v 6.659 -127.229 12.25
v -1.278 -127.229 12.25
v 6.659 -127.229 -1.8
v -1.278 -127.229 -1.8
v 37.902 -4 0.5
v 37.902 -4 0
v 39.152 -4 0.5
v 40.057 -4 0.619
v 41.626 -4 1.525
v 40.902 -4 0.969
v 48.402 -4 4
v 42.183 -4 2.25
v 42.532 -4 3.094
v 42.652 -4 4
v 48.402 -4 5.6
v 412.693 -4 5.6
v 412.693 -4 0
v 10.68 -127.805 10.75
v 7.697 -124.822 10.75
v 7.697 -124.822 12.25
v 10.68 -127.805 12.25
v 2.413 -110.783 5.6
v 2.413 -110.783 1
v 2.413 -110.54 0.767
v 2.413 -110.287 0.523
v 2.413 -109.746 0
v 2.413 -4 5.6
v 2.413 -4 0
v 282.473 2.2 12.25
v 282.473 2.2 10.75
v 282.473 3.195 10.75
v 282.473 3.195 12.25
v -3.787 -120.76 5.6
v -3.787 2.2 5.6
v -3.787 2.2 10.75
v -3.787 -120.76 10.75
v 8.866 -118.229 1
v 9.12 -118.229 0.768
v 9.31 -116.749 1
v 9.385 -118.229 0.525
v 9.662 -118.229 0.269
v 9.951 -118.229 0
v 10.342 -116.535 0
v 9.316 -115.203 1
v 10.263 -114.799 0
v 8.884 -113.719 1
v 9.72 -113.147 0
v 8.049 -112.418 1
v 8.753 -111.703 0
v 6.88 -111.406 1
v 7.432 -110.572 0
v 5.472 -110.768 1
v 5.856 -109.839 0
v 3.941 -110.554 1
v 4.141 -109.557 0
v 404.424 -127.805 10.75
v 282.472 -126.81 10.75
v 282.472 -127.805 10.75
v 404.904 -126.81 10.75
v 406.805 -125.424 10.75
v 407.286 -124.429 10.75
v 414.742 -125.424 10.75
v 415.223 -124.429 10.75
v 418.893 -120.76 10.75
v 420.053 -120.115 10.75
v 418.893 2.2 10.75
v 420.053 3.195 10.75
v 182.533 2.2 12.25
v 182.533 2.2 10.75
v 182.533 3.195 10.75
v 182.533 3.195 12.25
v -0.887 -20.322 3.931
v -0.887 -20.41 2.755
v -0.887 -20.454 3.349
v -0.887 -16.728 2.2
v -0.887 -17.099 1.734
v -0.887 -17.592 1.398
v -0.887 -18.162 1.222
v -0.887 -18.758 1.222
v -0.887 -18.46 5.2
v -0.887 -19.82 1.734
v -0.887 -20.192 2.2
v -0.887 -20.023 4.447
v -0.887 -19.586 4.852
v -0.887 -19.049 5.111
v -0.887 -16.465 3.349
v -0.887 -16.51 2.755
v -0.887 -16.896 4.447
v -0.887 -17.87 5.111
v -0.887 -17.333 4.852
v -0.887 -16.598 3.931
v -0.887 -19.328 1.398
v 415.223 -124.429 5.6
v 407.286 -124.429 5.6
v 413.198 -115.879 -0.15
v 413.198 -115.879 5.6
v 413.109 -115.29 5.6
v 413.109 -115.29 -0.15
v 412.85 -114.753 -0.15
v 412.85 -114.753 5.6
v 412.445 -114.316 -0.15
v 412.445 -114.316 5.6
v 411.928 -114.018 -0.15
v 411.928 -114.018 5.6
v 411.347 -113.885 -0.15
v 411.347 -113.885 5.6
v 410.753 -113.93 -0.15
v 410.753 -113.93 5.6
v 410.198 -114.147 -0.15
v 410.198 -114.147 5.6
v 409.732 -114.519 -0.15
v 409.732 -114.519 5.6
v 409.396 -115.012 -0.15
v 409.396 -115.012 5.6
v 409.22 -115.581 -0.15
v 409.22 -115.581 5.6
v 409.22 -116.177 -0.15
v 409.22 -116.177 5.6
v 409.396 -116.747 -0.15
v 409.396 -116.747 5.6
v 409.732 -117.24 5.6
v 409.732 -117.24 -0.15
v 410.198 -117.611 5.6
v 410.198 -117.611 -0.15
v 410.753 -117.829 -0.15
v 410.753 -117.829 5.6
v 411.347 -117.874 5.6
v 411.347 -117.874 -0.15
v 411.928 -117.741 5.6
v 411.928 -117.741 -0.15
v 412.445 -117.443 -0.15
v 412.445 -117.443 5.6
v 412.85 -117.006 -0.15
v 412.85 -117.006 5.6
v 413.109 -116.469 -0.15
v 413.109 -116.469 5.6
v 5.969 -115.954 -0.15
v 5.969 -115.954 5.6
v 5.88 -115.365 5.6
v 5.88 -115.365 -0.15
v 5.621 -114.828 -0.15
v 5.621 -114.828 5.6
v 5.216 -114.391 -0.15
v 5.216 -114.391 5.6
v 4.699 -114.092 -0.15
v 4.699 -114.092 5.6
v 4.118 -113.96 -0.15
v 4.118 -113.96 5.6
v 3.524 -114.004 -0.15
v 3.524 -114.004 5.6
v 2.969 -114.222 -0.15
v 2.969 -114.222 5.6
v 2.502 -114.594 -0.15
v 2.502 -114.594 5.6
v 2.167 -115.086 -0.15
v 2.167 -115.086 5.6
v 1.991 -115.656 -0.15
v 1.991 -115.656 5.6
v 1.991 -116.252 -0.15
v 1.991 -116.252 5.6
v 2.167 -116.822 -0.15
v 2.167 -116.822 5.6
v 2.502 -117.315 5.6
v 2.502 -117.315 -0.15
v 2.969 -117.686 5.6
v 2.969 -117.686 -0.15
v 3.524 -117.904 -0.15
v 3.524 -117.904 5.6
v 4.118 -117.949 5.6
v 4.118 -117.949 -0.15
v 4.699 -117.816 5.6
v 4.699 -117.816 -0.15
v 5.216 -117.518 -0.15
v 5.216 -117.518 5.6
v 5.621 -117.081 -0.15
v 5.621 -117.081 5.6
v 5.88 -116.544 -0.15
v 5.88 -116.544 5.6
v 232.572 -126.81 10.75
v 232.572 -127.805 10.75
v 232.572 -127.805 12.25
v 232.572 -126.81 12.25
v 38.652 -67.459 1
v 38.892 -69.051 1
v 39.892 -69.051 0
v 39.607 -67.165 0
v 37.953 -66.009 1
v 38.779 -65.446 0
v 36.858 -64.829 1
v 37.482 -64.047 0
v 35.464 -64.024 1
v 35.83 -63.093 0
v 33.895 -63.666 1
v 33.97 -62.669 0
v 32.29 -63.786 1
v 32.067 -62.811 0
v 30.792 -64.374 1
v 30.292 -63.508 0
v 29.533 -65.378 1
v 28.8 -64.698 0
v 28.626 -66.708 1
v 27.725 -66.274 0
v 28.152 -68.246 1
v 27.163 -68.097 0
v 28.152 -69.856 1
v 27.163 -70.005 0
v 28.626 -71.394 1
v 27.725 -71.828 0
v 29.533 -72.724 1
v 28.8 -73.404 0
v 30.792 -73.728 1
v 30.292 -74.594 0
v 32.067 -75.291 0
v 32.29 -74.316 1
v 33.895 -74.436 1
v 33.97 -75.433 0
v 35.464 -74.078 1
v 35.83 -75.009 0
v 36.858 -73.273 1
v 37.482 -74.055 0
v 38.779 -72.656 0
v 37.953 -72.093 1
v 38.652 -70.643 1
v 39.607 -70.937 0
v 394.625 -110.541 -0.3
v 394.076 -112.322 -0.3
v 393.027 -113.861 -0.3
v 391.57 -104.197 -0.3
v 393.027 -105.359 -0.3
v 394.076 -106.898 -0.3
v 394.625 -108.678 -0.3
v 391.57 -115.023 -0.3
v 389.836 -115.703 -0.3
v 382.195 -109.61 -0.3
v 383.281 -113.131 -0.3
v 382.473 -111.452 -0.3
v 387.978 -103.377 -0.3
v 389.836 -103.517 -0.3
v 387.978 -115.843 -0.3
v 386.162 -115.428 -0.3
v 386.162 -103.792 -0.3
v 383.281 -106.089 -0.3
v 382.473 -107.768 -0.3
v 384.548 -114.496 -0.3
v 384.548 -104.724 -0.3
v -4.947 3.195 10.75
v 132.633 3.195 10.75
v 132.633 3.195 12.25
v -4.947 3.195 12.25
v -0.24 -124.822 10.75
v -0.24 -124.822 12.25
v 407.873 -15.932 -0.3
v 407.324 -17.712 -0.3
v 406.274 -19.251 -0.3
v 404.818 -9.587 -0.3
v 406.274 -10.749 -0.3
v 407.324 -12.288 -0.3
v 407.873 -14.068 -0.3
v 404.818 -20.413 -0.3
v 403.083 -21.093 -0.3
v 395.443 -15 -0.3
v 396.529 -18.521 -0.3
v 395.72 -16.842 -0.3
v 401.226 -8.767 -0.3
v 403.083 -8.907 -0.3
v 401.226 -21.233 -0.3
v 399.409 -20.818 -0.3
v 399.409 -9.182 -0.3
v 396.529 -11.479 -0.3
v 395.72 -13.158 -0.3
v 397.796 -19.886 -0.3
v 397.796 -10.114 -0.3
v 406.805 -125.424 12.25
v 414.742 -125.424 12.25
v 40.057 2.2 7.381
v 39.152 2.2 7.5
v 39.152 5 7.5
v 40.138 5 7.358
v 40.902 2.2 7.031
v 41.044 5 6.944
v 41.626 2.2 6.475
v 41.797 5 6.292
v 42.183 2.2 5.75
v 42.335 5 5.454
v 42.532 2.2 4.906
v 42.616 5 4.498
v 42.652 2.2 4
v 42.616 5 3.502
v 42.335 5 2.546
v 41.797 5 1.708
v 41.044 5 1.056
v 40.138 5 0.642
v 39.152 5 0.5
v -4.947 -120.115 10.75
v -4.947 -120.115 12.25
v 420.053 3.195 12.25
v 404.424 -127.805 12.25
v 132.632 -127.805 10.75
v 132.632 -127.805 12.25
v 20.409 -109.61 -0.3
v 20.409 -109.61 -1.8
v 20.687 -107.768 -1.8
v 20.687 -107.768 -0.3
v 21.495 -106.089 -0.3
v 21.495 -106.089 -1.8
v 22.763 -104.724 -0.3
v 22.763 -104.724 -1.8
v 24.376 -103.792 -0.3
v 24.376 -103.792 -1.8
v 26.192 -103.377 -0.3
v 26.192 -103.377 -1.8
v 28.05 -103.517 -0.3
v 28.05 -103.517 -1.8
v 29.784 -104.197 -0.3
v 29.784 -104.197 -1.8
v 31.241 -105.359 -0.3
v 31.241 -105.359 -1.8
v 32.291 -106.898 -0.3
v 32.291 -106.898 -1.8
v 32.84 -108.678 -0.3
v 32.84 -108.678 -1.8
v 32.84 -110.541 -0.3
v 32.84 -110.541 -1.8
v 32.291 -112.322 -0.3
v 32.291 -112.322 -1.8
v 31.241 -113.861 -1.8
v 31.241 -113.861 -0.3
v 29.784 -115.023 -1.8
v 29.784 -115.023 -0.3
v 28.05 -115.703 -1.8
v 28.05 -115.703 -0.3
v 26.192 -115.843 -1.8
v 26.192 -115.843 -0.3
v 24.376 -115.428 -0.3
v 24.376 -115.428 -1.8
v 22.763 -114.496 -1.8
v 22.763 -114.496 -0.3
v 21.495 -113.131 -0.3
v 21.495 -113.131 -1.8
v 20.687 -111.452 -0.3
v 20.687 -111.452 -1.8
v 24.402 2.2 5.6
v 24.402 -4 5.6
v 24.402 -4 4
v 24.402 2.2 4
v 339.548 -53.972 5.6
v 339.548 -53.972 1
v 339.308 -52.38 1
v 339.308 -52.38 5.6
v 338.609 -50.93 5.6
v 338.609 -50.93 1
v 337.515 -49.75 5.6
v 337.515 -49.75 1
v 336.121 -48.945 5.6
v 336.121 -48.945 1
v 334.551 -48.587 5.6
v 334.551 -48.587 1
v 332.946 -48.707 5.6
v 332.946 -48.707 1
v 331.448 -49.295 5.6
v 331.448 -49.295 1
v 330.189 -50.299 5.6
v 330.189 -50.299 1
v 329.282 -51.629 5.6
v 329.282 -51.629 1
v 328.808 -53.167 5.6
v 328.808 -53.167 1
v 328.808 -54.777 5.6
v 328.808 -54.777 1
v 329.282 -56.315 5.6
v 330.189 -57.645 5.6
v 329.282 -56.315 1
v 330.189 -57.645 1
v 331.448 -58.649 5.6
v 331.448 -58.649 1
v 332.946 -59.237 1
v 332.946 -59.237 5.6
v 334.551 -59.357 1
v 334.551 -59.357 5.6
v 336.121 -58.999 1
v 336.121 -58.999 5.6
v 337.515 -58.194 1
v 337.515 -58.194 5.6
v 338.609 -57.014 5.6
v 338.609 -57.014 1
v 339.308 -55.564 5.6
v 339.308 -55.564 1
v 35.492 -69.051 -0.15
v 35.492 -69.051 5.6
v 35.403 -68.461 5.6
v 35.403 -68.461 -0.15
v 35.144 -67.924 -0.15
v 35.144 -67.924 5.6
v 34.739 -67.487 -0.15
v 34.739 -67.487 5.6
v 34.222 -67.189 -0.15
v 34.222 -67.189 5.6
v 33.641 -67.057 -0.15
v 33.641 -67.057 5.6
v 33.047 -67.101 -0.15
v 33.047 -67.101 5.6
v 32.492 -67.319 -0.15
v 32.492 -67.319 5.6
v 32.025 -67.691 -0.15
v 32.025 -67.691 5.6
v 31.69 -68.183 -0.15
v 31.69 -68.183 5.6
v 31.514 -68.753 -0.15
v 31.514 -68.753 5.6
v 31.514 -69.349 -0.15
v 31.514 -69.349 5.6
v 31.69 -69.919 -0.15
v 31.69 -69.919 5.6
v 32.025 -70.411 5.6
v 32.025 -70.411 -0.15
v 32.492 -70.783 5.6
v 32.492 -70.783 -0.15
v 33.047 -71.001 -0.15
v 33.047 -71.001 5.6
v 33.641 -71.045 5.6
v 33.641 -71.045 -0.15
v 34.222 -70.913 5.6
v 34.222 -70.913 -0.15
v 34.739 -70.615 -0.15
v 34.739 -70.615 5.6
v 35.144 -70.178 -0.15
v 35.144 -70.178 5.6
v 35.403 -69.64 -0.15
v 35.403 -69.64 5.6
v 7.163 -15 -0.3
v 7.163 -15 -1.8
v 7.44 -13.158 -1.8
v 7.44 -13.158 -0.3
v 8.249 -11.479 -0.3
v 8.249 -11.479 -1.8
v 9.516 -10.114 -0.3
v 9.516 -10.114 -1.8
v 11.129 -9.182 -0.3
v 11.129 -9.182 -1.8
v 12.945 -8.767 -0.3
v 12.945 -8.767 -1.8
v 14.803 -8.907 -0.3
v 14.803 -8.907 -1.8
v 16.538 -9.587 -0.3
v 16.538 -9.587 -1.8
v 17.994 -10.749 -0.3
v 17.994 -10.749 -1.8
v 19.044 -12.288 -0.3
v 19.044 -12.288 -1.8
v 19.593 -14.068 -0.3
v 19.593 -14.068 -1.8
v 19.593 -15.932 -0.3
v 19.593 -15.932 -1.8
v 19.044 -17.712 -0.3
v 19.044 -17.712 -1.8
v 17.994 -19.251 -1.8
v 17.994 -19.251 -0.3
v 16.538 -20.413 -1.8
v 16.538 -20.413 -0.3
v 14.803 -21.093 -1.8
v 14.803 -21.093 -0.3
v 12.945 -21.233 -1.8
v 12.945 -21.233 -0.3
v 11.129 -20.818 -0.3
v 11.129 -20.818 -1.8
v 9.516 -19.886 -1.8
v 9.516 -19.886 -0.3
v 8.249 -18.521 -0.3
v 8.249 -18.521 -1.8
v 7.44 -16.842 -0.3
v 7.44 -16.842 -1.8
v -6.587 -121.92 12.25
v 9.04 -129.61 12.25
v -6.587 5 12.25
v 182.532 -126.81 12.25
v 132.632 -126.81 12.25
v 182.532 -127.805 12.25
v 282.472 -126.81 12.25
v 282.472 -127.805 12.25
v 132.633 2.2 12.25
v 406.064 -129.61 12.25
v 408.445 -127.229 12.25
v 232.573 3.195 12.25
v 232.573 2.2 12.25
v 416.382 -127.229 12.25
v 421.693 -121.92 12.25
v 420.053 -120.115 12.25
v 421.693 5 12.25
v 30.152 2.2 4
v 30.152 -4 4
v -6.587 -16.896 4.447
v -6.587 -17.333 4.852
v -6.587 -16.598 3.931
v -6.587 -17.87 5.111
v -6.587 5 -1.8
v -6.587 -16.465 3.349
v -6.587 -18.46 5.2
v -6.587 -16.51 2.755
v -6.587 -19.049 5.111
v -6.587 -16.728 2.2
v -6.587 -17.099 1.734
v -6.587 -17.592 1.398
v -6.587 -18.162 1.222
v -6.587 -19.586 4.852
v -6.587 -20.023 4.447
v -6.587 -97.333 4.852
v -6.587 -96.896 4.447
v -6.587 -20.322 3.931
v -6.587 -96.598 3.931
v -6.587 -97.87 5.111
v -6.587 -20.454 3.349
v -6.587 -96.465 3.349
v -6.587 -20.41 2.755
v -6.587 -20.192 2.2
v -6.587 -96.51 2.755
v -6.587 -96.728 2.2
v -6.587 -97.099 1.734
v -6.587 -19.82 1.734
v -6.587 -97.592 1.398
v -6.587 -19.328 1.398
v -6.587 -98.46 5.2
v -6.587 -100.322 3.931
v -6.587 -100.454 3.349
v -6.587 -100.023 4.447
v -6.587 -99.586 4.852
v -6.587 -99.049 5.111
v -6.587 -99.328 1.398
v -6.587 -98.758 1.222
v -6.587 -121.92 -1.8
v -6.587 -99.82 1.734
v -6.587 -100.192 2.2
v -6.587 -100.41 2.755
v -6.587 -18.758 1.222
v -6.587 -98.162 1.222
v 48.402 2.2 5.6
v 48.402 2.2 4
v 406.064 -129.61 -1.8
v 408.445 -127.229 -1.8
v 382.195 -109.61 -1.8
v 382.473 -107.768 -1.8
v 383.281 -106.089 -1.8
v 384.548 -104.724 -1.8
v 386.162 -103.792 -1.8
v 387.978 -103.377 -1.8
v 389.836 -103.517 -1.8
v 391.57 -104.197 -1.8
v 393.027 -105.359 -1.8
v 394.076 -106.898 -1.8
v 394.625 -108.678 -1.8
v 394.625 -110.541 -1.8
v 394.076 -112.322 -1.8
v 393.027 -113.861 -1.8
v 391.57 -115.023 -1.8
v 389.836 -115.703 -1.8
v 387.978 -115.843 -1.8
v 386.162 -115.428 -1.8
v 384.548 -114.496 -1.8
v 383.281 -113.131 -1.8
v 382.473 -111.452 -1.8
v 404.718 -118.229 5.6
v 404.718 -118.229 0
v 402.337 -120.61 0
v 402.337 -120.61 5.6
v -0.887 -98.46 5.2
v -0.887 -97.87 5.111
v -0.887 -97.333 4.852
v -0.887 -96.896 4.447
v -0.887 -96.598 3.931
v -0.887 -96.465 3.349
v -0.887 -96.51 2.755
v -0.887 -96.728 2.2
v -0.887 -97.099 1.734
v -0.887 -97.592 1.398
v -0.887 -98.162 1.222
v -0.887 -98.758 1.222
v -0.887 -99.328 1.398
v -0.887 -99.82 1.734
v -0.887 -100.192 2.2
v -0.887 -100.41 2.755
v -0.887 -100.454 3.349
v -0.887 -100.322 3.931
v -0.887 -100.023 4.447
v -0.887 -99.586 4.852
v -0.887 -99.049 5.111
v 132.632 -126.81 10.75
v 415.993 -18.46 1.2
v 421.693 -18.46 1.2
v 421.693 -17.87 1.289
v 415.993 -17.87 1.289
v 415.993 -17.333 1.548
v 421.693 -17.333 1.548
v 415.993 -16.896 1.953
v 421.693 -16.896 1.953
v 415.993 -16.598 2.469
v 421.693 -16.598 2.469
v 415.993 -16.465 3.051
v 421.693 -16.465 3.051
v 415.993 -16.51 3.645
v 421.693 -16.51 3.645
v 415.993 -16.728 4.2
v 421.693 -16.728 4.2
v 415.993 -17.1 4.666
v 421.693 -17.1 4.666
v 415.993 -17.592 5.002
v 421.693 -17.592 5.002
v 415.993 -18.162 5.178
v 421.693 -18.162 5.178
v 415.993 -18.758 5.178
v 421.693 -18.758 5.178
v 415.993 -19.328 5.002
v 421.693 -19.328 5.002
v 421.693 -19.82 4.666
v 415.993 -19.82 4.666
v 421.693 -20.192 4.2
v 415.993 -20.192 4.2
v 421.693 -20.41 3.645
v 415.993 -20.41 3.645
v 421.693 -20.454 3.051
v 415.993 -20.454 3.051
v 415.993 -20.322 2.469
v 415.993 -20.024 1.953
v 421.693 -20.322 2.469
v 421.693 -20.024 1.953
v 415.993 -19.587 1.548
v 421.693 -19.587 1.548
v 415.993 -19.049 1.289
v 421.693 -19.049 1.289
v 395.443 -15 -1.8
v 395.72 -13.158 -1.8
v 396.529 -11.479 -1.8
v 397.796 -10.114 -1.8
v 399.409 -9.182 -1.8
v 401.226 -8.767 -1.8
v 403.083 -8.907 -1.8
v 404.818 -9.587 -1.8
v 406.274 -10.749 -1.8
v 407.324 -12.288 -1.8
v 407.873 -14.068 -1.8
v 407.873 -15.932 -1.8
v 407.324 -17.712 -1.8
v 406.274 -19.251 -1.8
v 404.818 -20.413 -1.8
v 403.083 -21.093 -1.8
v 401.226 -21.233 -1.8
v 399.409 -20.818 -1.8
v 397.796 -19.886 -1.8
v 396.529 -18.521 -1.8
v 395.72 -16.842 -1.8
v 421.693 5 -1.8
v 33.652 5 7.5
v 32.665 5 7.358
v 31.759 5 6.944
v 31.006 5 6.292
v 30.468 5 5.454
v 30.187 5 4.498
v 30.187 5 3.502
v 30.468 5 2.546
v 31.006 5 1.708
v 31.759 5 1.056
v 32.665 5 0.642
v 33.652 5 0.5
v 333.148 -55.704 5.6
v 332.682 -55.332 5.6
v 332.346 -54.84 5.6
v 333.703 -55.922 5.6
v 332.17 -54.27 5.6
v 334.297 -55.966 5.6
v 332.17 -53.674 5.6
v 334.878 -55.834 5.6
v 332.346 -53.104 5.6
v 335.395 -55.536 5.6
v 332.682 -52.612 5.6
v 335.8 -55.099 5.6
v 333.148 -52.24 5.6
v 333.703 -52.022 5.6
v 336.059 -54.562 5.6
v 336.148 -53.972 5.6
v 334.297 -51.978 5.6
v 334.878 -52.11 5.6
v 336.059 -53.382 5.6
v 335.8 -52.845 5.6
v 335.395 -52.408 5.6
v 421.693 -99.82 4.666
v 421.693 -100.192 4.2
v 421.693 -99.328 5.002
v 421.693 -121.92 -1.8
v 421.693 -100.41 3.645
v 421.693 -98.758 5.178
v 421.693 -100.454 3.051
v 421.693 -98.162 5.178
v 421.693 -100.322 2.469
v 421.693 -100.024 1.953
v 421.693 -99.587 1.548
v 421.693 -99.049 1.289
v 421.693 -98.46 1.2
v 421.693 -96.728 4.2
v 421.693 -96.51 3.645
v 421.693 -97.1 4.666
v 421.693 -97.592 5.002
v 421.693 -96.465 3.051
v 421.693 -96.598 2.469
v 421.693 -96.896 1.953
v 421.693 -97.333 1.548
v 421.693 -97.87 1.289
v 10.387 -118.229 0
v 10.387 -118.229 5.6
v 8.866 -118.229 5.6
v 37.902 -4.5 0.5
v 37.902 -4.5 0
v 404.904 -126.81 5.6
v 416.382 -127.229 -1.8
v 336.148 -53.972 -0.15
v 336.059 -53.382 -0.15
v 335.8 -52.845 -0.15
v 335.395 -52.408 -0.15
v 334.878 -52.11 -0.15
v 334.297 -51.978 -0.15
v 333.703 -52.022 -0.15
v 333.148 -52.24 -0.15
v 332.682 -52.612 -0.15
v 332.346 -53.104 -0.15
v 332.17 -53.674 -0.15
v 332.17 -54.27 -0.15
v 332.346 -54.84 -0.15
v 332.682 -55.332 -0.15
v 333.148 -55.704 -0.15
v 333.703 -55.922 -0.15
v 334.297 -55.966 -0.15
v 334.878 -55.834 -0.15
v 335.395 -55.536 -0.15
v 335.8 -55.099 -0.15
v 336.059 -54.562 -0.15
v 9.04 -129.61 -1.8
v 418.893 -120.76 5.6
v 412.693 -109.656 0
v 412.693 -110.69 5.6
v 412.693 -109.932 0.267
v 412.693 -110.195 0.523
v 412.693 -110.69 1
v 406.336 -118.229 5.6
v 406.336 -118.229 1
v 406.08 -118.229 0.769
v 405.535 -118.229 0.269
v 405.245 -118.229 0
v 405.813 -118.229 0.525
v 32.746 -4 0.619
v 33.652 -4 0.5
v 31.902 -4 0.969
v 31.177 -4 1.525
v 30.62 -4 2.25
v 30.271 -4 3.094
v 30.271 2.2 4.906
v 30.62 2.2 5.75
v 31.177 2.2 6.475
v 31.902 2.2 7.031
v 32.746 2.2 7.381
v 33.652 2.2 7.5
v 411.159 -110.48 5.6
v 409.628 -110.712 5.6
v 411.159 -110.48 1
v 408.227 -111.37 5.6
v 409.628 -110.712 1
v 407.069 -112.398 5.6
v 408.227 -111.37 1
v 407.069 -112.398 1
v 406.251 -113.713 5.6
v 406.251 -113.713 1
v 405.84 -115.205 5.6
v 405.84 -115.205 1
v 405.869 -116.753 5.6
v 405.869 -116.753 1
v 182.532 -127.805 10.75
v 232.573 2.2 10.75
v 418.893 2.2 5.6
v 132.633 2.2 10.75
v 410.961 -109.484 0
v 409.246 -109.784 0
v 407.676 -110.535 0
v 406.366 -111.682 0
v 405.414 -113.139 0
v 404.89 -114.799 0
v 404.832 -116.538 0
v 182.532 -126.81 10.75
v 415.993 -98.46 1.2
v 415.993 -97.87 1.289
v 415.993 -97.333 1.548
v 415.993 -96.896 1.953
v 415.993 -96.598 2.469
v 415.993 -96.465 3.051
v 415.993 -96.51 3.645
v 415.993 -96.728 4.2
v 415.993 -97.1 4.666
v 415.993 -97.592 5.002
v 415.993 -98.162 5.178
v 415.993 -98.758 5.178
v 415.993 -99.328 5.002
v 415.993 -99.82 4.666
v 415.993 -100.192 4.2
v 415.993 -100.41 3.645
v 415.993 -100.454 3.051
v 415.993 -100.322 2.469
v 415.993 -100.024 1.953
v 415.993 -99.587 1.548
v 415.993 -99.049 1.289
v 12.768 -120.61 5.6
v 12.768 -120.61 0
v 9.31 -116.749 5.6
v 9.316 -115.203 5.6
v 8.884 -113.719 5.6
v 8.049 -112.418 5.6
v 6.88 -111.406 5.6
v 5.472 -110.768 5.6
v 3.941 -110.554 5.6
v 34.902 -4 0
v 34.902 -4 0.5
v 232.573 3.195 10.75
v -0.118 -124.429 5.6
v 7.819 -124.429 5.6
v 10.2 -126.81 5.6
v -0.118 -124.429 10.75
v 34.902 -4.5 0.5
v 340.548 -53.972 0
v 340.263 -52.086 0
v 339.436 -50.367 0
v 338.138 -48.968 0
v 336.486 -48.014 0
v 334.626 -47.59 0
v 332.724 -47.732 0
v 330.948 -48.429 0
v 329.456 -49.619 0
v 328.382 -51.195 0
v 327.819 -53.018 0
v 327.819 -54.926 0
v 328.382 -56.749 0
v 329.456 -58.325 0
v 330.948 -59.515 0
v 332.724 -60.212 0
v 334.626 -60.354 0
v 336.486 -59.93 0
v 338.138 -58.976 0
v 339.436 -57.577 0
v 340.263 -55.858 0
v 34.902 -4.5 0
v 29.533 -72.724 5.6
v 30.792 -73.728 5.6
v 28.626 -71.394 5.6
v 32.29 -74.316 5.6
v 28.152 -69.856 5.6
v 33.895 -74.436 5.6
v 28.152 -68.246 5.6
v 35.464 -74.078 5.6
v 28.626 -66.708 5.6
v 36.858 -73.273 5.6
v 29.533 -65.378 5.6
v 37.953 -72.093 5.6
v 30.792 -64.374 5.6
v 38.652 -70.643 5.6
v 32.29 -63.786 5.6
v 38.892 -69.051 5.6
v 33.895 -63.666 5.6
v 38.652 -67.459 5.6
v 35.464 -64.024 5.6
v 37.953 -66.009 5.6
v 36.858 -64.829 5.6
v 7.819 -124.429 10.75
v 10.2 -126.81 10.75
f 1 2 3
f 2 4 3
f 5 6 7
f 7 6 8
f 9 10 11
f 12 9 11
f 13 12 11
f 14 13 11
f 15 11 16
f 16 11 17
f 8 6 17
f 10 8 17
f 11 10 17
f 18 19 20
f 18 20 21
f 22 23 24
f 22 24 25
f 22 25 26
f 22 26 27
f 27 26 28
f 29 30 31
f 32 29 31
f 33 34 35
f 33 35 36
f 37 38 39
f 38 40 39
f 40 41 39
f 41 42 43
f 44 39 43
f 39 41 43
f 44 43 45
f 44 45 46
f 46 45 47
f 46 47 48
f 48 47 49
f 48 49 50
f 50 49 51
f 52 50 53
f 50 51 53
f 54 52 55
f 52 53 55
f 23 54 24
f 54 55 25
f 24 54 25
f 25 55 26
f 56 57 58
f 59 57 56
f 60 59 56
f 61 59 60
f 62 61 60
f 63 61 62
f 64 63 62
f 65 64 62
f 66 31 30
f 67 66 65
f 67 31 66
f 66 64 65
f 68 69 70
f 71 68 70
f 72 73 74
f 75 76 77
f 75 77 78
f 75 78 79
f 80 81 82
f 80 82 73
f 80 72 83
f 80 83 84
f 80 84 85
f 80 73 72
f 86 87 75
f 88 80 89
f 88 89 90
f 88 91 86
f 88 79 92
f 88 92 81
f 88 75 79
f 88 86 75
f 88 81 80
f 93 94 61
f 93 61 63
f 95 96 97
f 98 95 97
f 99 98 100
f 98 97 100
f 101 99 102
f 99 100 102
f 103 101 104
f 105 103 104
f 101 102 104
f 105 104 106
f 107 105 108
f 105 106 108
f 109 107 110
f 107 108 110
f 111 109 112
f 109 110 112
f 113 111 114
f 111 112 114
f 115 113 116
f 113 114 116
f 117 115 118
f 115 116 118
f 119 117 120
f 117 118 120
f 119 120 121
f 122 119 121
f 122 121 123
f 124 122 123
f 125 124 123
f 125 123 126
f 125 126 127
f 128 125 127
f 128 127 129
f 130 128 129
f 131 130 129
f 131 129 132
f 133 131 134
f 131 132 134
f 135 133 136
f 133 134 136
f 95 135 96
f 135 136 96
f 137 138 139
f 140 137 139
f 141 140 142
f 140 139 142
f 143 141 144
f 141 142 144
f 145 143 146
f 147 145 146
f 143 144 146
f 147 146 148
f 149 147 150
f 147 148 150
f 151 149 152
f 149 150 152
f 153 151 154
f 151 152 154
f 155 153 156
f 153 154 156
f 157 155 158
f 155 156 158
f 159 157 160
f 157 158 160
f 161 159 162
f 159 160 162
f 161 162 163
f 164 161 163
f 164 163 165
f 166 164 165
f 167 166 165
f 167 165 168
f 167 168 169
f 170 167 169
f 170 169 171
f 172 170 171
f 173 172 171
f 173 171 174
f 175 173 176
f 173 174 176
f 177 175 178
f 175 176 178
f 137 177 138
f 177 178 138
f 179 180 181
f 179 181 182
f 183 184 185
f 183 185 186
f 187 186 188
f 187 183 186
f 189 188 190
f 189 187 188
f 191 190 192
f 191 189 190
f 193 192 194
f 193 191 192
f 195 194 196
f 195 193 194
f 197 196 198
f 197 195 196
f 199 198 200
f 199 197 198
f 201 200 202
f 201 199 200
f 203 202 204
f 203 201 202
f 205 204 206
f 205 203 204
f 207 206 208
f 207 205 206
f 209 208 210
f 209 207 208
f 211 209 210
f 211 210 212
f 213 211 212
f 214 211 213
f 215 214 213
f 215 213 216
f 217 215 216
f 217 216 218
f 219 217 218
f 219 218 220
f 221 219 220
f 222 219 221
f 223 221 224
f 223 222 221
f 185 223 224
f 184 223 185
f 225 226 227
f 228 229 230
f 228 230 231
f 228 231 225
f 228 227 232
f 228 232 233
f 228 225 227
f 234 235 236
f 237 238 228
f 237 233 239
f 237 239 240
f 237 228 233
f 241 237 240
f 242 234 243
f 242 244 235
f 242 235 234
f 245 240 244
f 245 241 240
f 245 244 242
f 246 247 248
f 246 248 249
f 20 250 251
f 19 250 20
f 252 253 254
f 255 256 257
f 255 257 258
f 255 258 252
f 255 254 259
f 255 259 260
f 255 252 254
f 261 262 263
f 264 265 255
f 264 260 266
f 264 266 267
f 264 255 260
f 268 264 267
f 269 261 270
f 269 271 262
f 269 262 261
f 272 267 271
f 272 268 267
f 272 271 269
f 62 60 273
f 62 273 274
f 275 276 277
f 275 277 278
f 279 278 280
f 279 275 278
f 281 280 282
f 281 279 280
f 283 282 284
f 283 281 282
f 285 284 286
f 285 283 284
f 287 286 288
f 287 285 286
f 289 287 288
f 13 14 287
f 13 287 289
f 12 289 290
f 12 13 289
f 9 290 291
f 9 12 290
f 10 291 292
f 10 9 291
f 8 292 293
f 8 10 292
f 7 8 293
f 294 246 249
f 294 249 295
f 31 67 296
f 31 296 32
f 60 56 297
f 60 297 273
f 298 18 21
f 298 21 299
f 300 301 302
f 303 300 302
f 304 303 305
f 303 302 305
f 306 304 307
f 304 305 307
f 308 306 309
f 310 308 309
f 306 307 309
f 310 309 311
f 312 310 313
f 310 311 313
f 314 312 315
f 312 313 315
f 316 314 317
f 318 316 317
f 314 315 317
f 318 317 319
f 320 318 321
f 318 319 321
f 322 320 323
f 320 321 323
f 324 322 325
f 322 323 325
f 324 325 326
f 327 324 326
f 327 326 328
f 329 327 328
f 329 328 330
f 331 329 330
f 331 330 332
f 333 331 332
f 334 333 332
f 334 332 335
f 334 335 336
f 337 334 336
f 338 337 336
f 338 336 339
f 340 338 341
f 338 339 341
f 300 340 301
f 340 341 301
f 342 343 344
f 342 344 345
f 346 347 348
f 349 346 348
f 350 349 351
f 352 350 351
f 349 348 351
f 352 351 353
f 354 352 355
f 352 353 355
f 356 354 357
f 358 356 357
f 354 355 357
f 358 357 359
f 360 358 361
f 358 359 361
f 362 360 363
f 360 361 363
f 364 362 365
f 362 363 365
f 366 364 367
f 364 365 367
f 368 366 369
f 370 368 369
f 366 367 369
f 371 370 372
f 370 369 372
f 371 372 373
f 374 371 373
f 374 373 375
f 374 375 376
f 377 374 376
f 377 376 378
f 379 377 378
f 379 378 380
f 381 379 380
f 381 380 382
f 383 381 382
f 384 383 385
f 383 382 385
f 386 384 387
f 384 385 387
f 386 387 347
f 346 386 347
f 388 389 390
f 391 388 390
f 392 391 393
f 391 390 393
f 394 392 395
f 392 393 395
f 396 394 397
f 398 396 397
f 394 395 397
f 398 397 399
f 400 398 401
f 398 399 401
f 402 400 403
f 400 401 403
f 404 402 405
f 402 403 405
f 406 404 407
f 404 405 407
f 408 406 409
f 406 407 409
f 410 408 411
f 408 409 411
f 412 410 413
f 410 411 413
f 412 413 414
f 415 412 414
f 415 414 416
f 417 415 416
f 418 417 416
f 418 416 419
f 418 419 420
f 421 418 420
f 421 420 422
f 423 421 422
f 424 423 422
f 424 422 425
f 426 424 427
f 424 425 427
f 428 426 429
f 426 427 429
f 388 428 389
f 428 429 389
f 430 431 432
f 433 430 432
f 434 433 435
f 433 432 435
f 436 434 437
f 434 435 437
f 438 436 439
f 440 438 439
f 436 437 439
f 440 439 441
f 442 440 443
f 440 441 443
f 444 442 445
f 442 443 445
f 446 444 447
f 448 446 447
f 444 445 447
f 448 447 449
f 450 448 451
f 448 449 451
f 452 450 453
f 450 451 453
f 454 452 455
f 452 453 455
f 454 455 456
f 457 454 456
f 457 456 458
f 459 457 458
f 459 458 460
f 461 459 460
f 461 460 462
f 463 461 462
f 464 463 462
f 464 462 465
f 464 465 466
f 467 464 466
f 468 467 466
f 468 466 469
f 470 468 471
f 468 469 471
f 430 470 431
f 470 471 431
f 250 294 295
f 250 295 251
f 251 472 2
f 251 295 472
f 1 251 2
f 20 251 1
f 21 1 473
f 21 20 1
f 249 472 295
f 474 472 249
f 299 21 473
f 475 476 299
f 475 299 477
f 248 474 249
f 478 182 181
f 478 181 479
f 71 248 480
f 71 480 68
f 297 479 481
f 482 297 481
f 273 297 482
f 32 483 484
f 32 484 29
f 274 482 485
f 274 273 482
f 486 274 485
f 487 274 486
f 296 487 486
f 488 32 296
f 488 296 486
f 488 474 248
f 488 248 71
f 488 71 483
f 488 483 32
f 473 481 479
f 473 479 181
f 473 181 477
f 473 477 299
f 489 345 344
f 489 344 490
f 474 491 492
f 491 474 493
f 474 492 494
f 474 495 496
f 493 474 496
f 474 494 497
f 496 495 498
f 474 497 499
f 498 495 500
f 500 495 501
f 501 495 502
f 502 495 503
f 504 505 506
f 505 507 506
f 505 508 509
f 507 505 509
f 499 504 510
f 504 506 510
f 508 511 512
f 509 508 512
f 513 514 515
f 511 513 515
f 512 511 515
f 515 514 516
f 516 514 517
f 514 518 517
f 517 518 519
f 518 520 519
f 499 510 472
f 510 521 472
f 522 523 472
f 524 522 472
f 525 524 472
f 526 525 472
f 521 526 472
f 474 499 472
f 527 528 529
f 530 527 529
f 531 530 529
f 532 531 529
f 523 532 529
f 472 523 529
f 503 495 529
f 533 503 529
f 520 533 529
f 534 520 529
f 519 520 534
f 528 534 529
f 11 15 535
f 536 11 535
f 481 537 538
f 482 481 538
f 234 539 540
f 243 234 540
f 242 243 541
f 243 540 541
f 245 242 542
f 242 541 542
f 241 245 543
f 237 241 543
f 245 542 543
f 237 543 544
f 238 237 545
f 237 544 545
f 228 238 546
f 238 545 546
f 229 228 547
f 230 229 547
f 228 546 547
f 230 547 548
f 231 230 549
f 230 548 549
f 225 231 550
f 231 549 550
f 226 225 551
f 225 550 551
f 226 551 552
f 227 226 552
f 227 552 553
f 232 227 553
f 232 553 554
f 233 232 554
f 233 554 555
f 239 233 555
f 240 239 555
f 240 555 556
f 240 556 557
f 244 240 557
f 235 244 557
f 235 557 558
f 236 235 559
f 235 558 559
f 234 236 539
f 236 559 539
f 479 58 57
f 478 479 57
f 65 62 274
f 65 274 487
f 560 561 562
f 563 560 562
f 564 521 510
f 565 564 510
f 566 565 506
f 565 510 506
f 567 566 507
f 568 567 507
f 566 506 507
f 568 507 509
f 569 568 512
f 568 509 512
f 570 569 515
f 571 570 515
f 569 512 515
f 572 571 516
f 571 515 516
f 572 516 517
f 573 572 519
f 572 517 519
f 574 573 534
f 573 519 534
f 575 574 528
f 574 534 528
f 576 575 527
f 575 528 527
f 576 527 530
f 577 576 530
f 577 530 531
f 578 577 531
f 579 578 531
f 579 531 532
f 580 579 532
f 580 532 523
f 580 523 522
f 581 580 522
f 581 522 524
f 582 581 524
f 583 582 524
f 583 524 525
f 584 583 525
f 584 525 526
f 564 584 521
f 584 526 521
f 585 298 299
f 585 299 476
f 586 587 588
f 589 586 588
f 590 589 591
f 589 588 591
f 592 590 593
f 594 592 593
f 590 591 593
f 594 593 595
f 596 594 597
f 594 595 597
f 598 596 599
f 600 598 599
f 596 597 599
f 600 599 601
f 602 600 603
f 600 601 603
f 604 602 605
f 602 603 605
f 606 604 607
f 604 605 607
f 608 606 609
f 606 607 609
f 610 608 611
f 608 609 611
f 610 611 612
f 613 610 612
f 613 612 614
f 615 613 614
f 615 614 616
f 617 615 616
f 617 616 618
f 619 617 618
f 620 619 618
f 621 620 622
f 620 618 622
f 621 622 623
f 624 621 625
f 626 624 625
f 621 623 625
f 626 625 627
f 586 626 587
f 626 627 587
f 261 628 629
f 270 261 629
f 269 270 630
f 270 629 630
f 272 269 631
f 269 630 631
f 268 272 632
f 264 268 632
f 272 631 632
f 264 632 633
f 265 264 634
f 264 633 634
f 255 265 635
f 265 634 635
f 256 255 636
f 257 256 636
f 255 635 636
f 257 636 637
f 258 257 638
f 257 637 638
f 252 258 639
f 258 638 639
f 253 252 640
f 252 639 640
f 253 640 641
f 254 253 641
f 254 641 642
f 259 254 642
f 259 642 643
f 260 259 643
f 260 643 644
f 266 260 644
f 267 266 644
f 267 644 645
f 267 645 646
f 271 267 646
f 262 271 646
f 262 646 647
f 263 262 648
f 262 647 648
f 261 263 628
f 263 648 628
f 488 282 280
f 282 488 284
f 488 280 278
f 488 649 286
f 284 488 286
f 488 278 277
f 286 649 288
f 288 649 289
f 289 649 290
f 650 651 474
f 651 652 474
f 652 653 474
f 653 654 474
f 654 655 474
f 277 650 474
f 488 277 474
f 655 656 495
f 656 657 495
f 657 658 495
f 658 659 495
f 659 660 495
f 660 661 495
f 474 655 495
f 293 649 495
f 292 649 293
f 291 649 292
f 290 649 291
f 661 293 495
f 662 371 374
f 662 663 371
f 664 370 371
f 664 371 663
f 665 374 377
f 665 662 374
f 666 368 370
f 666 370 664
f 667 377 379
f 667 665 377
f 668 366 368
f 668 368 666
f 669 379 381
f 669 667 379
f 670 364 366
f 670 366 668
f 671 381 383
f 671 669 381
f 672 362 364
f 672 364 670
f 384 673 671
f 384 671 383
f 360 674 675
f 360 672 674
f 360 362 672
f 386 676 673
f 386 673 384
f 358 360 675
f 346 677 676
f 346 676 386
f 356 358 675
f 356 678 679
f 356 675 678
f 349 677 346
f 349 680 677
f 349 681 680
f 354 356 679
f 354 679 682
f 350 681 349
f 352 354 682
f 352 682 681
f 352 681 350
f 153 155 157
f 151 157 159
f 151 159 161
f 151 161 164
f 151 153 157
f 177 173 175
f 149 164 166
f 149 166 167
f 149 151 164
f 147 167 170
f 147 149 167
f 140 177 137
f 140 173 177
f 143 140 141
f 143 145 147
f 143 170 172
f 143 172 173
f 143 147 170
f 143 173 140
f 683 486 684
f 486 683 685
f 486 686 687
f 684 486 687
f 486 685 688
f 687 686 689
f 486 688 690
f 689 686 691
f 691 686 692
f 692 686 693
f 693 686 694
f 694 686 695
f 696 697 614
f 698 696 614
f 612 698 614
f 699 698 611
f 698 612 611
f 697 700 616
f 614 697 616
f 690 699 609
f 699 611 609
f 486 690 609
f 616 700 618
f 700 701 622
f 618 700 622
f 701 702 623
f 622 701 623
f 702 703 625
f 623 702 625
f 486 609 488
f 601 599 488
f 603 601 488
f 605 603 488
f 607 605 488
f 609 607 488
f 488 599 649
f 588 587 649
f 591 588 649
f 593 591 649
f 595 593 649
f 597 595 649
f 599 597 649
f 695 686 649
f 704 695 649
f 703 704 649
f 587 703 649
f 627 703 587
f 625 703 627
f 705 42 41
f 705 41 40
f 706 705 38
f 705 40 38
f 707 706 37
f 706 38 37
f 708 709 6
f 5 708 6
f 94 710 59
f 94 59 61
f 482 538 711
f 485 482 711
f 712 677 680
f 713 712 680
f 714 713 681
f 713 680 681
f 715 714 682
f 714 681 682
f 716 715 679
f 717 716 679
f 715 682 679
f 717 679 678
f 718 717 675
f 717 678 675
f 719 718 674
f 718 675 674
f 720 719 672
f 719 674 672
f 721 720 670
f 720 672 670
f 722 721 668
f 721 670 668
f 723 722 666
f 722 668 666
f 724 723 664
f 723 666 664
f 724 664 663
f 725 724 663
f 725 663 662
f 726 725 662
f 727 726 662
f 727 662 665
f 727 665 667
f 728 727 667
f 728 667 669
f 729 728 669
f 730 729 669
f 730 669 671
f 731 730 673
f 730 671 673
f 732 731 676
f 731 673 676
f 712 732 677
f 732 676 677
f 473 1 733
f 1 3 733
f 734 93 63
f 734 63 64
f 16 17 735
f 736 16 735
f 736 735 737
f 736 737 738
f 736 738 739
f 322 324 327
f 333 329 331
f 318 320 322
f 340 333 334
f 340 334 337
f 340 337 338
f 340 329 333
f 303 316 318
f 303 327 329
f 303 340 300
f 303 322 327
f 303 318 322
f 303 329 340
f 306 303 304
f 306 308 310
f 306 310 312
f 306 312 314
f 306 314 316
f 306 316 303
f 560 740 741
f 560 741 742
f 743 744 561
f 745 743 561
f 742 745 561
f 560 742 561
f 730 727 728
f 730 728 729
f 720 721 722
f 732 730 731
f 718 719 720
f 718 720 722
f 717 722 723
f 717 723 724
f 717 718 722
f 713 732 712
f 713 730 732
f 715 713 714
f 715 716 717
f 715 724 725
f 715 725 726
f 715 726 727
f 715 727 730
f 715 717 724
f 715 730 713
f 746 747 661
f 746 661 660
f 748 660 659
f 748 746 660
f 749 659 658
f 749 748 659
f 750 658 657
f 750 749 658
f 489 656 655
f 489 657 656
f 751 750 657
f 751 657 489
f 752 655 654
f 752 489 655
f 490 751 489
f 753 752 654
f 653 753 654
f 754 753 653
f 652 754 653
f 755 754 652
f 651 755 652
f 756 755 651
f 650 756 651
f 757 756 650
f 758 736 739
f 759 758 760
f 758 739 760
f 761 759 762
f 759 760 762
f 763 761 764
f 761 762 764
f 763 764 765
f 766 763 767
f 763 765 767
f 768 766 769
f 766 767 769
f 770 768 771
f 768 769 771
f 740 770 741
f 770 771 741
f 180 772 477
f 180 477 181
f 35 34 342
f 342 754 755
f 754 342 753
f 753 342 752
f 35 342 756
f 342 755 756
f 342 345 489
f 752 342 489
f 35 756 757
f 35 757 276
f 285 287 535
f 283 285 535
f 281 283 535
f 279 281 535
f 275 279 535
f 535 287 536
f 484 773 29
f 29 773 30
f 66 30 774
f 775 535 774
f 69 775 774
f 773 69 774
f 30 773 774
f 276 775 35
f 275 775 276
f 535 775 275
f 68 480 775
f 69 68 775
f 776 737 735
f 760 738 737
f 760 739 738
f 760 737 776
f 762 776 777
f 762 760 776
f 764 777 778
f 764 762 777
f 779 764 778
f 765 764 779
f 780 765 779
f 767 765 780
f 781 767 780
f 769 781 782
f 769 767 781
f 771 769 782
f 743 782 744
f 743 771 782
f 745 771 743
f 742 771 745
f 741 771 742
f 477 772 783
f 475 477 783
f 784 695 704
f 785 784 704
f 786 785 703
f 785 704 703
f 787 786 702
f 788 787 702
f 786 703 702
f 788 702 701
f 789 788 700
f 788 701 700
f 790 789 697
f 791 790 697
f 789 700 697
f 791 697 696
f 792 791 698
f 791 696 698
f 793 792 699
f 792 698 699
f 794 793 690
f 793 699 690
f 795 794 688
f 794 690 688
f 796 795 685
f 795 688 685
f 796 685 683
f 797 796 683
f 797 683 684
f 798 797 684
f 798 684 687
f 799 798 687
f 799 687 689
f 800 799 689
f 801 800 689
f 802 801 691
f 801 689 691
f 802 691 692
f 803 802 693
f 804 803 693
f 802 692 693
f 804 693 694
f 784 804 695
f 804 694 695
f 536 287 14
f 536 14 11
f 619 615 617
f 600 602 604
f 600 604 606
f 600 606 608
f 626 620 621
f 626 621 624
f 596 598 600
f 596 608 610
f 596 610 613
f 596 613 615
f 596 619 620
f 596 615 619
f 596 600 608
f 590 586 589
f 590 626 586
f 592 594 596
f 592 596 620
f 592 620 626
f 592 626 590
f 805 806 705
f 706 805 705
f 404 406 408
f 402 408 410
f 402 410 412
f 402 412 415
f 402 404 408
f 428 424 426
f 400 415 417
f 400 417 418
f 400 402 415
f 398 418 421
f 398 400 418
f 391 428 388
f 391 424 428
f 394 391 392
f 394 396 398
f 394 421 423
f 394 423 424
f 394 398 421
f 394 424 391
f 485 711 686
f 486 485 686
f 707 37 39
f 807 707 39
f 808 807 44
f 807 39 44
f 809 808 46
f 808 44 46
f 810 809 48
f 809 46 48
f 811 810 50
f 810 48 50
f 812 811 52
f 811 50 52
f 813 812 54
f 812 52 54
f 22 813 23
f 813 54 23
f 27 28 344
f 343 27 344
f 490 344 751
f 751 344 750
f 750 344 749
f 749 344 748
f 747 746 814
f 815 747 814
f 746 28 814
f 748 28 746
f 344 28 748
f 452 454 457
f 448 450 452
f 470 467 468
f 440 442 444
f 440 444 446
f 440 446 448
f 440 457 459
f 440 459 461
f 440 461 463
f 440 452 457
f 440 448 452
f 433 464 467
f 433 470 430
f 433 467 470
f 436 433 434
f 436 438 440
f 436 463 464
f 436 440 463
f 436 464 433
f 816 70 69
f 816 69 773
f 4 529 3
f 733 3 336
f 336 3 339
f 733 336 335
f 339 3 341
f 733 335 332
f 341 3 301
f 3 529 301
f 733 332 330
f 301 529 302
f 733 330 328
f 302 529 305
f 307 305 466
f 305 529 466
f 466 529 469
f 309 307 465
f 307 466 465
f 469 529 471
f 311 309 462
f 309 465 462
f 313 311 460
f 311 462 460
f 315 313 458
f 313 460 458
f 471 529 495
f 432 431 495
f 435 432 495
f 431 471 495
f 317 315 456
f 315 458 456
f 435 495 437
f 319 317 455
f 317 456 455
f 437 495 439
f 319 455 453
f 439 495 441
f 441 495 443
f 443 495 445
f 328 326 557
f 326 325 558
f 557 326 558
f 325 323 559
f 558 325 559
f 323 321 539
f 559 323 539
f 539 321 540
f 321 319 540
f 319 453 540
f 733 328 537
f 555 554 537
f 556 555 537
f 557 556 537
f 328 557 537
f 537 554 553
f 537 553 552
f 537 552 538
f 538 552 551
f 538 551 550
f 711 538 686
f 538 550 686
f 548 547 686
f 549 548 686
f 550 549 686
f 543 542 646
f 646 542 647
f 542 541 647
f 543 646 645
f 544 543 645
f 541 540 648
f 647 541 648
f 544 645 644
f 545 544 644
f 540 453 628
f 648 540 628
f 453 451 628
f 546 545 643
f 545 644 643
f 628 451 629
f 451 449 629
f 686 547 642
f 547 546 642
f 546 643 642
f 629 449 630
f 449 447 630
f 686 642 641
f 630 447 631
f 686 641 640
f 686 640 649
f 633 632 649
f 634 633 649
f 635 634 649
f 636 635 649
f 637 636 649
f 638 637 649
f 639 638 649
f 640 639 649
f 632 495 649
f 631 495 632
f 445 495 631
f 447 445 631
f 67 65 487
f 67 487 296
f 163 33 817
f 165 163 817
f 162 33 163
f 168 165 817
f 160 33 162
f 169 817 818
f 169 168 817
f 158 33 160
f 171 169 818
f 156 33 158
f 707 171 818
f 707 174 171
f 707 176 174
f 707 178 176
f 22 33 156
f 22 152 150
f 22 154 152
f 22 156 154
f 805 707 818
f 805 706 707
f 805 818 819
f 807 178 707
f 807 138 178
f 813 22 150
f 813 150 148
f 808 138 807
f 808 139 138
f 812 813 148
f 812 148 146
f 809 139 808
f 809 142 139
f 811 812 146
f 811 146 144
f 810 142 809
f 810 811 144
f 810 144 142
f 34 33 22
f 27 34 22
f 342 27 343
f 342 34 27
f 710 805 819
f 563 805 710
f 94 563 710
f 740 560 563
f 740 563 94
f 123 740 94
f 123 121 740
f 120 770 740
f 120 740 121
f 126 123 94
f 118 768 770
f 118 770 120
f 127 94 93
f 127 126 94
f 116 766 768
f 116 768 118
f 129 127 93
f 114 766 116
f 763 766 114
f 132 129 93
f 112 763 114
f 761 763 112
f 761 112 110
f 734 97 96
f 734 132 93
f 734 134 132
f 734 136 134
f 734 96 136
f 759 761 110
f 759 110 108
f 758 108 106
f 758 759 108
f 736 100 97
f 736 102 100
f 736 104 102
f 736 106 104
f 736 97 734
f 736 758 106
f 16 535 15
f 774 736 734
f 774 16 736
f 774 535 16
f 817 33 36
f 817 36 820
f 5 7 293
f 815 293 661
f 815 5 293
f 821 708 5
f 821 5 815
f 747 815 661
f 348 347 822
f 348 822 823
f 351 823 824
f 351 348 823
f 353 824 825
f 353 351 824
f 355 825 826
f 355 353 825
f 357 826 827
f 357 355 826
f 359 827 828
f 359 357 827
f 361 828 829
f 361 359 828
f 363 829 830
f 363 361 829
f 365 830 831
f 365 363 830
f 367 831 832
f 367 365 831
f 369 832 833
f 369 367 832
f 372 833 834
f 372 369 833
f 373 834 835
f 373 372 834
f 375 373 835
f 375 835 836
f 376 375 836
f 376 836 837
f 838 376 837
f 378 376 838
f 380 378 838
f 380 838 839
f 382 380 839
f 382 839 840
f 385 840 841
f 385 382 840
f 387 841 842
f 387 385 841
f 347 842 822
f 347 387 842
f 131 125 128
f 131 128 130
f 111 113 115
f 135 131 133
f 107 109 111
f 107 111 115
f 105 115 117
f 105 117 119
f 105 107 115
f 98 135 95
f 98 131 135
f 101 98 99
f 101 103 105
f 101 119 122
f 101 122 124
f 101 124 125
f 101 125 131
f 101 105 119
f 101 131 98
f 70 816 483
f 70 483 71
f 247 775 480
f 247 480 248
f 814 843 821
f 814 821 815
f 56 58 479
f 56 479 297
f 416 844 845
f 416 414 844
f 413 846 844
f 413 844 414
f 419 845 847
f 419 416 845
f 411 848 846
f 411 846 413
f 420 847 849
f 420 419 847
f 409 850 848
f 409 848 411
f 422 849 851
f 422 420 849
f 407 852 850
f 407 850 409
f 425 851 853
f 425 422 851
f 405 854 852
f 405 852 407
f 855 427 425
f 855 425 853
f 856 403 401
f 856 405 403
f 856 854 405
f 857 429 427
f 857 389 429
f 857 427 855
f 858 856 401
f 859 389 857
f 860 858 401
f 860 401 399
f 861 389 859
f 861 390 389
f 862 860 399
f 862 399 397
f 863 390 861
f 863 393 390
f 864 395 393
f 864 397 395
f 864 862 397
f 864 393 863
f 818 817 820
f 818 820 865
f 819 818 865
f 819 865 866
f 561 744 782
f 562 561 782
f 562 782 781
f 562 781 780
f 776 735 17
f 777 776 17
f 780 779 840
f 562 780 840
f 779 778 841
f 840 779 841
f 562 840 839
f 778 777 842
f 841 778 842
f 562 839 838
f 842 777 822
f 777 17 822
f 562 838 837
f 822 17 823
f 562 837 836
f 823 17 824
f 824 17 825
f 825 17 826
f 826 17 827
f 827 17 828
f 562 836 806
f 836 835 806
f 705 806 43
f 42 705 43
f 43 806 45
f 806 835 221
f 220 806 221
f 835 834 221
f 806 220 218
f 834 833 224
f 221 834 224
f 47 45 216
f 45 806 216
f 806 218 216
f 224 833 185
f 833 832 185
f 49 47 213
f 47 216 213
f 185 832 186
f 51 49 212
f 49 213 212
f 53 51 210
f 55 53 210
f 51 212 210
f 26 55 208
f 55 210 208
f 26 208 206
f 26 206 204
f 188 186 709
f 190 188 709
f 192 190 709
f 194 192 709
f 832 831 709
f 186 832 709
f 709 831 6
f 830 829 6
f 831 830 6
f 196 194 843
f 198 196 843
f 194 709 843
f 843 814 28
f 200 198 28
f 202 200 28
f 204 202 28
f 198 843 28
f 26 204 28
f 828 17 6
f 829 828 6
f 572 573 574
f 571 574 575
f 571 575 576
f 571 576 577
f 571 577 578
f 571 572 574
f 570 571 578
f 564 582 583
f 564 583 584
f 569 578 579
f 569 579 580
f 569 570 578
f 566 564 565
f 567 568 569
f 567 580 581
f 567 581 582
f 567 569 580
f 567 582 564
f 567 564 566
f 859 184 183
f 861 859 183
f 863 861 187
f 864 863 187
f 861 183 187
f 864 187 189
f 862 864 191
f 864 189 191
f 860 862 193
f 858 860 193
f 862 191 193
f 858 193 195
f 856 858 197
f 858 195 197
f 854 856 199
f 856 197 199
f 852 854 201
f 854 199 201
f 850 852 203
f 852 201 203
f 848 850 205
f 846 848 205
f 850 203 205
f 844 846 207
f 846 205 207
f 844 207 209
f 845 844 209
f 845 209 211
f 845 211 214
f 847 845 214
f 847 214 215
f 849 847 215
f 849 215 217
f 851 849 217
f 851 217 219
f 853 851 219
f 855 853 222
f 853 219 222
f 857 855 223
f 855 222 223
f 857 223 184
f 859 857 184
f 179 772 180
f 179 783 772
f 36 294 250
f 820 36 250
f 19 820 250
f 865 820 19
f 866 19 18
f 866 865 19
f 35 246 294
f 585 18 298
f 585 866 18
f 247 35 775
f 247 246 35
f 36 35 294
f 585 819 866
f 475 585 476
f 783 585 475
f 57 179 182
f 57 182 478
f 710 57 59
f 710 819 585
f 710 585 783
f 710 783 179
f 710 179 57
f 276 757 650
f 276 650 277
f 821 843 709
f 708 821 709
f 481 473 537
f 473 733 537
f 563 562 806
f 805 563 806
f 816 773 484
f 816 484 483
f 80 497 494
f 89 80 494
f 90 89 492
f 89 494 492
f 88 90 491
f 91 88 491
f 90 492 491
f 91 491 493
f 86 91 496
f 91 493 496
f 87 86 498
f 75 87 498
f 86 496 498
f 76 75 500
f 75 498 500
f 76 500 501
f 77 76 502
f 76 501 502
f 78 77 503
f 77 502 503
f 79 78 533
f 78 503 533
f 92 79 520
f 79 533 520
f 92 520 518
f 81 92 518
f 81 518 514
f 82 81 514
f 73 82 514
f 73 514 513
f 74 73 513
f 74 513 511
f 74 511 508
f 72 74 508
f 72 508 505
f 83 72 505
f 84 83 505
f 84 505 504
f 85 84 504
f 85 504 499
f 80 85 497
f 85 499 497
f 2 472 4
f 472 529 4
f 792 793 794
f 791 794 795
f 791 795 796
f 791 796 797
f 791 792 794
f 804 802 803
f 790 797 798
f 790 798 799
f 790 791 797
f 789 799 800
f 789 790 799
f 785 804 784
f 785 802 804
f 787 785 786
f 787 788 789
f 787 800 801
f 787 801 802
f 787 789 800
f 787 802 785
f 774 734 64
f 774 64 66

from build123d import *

# Parameters (mm, degrees)
P_IDAT_VYSUNUT_M1_DEPTH  = 5.6
SKO_EPINA1_T             = 1.8
P_IDAT_VYSUNUT_M3_DEPTH  = 5.15
P_IDAT_VYSUNUT_M4_DEPTH  = 7.4
P_IDAT_VYSUNUT_M5_DEPTH  = 1.5
SKICA14_W                = 49.9
SKICA14_H                = 0.995009232
P_IDAT_VYSUNUT_M6_DEPTH  = 1.5
SKICA15_R                = 5.4
SKICA15_W                = 3
SKICA15_H                = 9
P_IDAT_VYSUNUT_M7_DEPTH  = 5.6
SKICA16_R                = 2
ODEBRAT_VYSUNUT_M1_DEPTH = 5.75
ZKOSEN_1_SIZE            = 1
SKICA17_W                = 24
SKICA17_H                = 13.4
ODEBRAT_VYSUNUT_M2_DEPTH = 1.6
ODEBRAT_VYSUNUT_M3_REACH = 442.031
SKICA23_R                = 2
ODEBRAT_VYSUNUT_M4_DEPTH = 5.7
SKICA24_R                = 2
ODEBRAT_VYSUNUT_M5_DEPTH = 5.7
SKICA25_R                = 6.25
ODEBRAT_VYSUNUT_M6_DEPTH = 1.5


with BuildPart() as part:
    # Skica3 → Přidat vysunutím1 (new body)
    with BuildSketch(Plane.XY):
        Polygon((2.412545276, -4), (412.692715215, -4), (412.692715215, -118.191389918), (412.654731358, -118.229366948), (404.717731358, -118.229366948), (402.336688893, -120.609981536), (12.768122748, -120.609981536), (10.387229089, -118.22921813), (2.450229089, -118.22921813), (2.412545276, -118.191536378), align=None)
    extrude(amount=P_IDAT_VYSUNUT_M1_DEPTH)

    # Skořepina1
    sko_epina1_openings = [part.faces().sort_by_distance(p)[0] for p in [
        (207.552632266, -62.25279763, 5.6),
    ]]
    offset(amount=SKO_EPINA1_T, openings=sko_epina1_openings, kind=Kind.INTERSECTION)



with BuildPart() as body_2:
    # Skica7 → Přidat vysunutím3 (new body)
    with BuildSketch(Plane.XY.offset(5.6)):
        Polygon((-6.587454724, 5), (-6.587454724, -121.919602656), (-1.277548758, -127.22921813), (6.659451242, -127.22921813), (9.040344901, -129.609981536), (406.06413722, -129.609981536), (408.445179685, -127.229366948), (416.382179685, -127.229366948), (421.692715215, -121.919785731), (421.692715215, 5), align=None)
        Polygon((-3.787454724, 2.2), (-3.787454724, -120.759759814), (-0.11779565, -124.42921813), (7.81920435, -124.42921813), (10.200098009, -126.809981536), (404.904486629, -126.809981536), (407.285529094, -124.429366948), (415.222529094, -124.429366948), (418.892715215, -120.759840367), (418.892715215, 2.2), align=None, mode=Mode.SUBTRACT)
    extrude(amount=P_IDAT_VYSUNUT_M3_DEPTH)


with BuildPart() as part_1:
    add(part.part)

    add(body_2.part)  # Přidat vysunutím4 merges body 2
    # Skica8 → Přidat vysunutím4 (add)
    with BuildSketch(Plane(origin=(0, 0, 5.6), x_dir=(-1, 0, 0), z_dir=(0, 0, -1))):
        Polygon((-421.692715215, 5), (6.587454724, 5), (6.587454724, -121.919602656), (1.277548758, -127.22921813), (-6.659451242, -127.22921813), (-9.040344901, -129.609981536), (-406.06413722, -129.609981536), (-408.445179685, -127.229366948), (-416.382179685, -127.229366948), (-421.692715215, -121.919785731), align=None)
        Polygon((-0.612545276, -2.2), (-0.612545276, -118.937149634), (-1.70467352, -120.02921813), (-9.64167352, -120.02921813), (-12.022567179, -122.409981536), (-403.082178558, -122.409981536), (-405.463221024, -120.029366948), (-413.400221024, -120.029366948), (-414.492715215, -118.93706908), (-414.492715215, -2.2), align=None, mode=Mode.SUBTRACT)
    extrude(amount=P_IDAT_VYSUNUT_M4_DEPTH)

    # Skica11 → Přidat vysunutím5 (add)
    with BuildSketch(Plane.XY.offset(10.75)):
        Polygon((421.692715215, 5), (-6.587454724, 5), (-6.587454724, -121.919602656), (-1.277548758, -127.22921813), (6.659451242, -127.22921813), (9.040344901, -129.609981536), (406.06413722, -129.609981536), (408.445179685, -127.229366948), (416.382179685, -127.229366948), (421.692715215, -121.919785731), align=None)
        Polygon((420.052630246, 3.195009232), (-4.947369754, 3.195009232), (-4.947369754, -120.114611888), (-0.239981646, -124.821742467), (7.697018354, -124.821742467), (10.68042987, -127.804990768), (404.42405225, -127.804990768), (406.805094715, -125.424376181), (414.742094715, -125.424376181), (420.052630246, -120.114794964), align=None, mode=Mode.SUBTRACT)
    extrude(amount=P_IDAT_VYSUNUT_M5_DEPTH)

    # Skica14 → Přidat vysunutím6 (add)
    with BuildSketch(Plane.XY.offset(10.75)):
        with Locations((157.582630246, 2.697504616)):
            Rectangle(SKICA14_W, SKICA14_H)
        with Locations((257.522630246, 2.697504616)):
            Rectangle(SKICA14_W, SKICA14_H)
        with Locations((257.52224106, -127.307486152)):
            Rectangle(SKICA14_W, SKICA14_H)
        with Locations((157.58224106, -127.307486152)):
            Rectangle(SKICA14_W, SKICA14_H)
    extrude(amount=P_IDAT_VYSUNUT_M6_DEPTH)

    # Skica15 → Přidat vysunutím7 (add)
    with BuildSketch(Plane.XY):
        with Locations((3.968545276, -115.95421813)):
            Circle(SKICA15_R)
        with Locations((33.491545276, -69.050981536)):
            Circle(SKICA15_R)
        with Locations((411.197715215, -115.879366948)):
            Circle(SKICA15_R)
        with Locations((334.147715215, -53.972)):
            Circle(SKICA15_R)
        with Locations((36.401545276, 0)):
            Rectangle(SKICA15_W, SKICA15_H)
    extrude(amount=P_IDAT_VYSUNUT_M7_DEPTH)

    # Skica16 → Odebrat vysunutím1 (cut)
    with BuildSketch(Plane.XY.offset(5.6)):
        with Locations((3.968545276, -115.95421813)):
            Circle(SKICA16_R)
        with Locations((33.491545276, -69.050981536)):
            Circle(SKICA16_R)
        with Locations((334.147715215, -53.972)):
            Circle(SKICA16_R)
        with Locations((411.197715215, -115.879366948)):
            Circle(SKICA16_R)
    extrude(amount=-ODEBRAT_VYSUNUT_M1_DEPTH, mode=Mode.SUBTRACT)

    # Zkosení1
    zkosen_1_edges = [part_1.edges().sort_by_distance(p)[0] for p in [
        (8.049207709, -112.417525591, 0),
        (28.091545276, -69.050981536, 0),
        (407.069426922, -112.398384936, 0),
        (328.747715215, -53.972, 0),
    ]]
    chamfer(zkosen_1_edges, length=ZKOSEN_1_SIZE)

    # Skica17 → Odebrat vysunutím2 (cut)
    with BuildSketch(Plane.XY.offset(5.6)):
        with Locations((36.401545276, -4.5)):
            Rectangle(SKICA17_W, SKICA17_H)
    extrude(amount=-ODEBRAT_VYSUNUT_M2_DEPTH, mode=Mode.SUBTRACT)

    # Odebrat vysunutím3: up to this face of the body (flat: up to its plane)
    odebrat_vysunut_m3_end = Plane(part_1.part.faces().sort_by_distance((207.552630246, 5, 5.225))[0])
    # Skica18 → Odebrat vysunutím3 (cut, up to the picked face)
    with BuildSketch(Plane.XZ.offset(4.5), mode=Mode.PRIVATE) as odebrat_vysunut_m3_sk1:
        with BuildLine():
            Line((33.651545276, 7.5), (39.151545276, 7.5))
            ThreePointArc((39.151545276, 7.5), (42.651545276, 4), (39.151545276, 0.5))
            Line((39.151545276, 0.5), (33.651545276, 0.5))
            ThreePointArc((33.651545276, 0.5), (30.151545276, 4), (33.651545276, 7.5))
        make_face()
    odebrat_vysunut_m3_tool1 = split(extrude(odebrat_vysunut_m3_sk1.sketch, amount=-ODEBRAT_VYSUNUT_M3_REACH, mode=Mode.PRIVATE), bisect_by=odebrat_vysunut_m3_end, keep=Keep.BOTH, mode=Mode.PRIVATE)
    add(odebrat_vysunut_m3_tool1.solids().sort_by(Axis((36.401545, -4.5, 4), (0, 1, 0)))[0], mode=Mode.SUBTRACT)

    # Skica23 → Odebrat vysunutím4 (cut)
    with BuildSketch(Plane.ZY.offset(6.587454724)):
        with Locations((3.2, -18.459801328)):
            Circle(SKICA23_R)
        with Locations((3.2, -98.459801328)):
            Circle(SKICA23_R)
    extrude(amount=-ODEBRAT_VYSUNUT_M4_DEPTH, mode=Mode.SUBTRACT)

    # Skica24 → Odebrat vysunutím5 (cut)
    with BuildSketch(Plane(origin=(421.692715215, 0, 0), x_dir=(0, 0, -1), z_dir=(1, 0, 0))):
        with Locations((-3.2, -18.459892866)):
            Circle(SKICA24_R)
        with Locations((-3.2, -98.459892866)):
            Circle(SKICA24_R)
    extrude(amount=-ODEBRAT_VYSUNUT_M5_DEPTH, mode=Mode.SUBTRACT)

    # Skica25 → Odebrat vysunutím6 (cut)
    with BuildSketch(Plane(origin=(0, 0, -1.8), x_dir=(-1, 0, 0), z_dir=(0, 0, -1))):
        with Locations((-401.692715215, -15)):
            Circle(SKICA25_R)
        with Locations((-13.412545276, -15)):
            Circle(SKICA25_R)
        with Locations((-388.445179685, -109.609981536)):
            Circle(SKICA25_R)
        with Locations((-26.659451242, -109.609981536)):
            Circle(SKICA25_R)
    extrude(amount=-ODEBRAT_VYSUNUT_M6_DEPTH, mode=Mode.SUBTRACT)


solid = part_1.part
